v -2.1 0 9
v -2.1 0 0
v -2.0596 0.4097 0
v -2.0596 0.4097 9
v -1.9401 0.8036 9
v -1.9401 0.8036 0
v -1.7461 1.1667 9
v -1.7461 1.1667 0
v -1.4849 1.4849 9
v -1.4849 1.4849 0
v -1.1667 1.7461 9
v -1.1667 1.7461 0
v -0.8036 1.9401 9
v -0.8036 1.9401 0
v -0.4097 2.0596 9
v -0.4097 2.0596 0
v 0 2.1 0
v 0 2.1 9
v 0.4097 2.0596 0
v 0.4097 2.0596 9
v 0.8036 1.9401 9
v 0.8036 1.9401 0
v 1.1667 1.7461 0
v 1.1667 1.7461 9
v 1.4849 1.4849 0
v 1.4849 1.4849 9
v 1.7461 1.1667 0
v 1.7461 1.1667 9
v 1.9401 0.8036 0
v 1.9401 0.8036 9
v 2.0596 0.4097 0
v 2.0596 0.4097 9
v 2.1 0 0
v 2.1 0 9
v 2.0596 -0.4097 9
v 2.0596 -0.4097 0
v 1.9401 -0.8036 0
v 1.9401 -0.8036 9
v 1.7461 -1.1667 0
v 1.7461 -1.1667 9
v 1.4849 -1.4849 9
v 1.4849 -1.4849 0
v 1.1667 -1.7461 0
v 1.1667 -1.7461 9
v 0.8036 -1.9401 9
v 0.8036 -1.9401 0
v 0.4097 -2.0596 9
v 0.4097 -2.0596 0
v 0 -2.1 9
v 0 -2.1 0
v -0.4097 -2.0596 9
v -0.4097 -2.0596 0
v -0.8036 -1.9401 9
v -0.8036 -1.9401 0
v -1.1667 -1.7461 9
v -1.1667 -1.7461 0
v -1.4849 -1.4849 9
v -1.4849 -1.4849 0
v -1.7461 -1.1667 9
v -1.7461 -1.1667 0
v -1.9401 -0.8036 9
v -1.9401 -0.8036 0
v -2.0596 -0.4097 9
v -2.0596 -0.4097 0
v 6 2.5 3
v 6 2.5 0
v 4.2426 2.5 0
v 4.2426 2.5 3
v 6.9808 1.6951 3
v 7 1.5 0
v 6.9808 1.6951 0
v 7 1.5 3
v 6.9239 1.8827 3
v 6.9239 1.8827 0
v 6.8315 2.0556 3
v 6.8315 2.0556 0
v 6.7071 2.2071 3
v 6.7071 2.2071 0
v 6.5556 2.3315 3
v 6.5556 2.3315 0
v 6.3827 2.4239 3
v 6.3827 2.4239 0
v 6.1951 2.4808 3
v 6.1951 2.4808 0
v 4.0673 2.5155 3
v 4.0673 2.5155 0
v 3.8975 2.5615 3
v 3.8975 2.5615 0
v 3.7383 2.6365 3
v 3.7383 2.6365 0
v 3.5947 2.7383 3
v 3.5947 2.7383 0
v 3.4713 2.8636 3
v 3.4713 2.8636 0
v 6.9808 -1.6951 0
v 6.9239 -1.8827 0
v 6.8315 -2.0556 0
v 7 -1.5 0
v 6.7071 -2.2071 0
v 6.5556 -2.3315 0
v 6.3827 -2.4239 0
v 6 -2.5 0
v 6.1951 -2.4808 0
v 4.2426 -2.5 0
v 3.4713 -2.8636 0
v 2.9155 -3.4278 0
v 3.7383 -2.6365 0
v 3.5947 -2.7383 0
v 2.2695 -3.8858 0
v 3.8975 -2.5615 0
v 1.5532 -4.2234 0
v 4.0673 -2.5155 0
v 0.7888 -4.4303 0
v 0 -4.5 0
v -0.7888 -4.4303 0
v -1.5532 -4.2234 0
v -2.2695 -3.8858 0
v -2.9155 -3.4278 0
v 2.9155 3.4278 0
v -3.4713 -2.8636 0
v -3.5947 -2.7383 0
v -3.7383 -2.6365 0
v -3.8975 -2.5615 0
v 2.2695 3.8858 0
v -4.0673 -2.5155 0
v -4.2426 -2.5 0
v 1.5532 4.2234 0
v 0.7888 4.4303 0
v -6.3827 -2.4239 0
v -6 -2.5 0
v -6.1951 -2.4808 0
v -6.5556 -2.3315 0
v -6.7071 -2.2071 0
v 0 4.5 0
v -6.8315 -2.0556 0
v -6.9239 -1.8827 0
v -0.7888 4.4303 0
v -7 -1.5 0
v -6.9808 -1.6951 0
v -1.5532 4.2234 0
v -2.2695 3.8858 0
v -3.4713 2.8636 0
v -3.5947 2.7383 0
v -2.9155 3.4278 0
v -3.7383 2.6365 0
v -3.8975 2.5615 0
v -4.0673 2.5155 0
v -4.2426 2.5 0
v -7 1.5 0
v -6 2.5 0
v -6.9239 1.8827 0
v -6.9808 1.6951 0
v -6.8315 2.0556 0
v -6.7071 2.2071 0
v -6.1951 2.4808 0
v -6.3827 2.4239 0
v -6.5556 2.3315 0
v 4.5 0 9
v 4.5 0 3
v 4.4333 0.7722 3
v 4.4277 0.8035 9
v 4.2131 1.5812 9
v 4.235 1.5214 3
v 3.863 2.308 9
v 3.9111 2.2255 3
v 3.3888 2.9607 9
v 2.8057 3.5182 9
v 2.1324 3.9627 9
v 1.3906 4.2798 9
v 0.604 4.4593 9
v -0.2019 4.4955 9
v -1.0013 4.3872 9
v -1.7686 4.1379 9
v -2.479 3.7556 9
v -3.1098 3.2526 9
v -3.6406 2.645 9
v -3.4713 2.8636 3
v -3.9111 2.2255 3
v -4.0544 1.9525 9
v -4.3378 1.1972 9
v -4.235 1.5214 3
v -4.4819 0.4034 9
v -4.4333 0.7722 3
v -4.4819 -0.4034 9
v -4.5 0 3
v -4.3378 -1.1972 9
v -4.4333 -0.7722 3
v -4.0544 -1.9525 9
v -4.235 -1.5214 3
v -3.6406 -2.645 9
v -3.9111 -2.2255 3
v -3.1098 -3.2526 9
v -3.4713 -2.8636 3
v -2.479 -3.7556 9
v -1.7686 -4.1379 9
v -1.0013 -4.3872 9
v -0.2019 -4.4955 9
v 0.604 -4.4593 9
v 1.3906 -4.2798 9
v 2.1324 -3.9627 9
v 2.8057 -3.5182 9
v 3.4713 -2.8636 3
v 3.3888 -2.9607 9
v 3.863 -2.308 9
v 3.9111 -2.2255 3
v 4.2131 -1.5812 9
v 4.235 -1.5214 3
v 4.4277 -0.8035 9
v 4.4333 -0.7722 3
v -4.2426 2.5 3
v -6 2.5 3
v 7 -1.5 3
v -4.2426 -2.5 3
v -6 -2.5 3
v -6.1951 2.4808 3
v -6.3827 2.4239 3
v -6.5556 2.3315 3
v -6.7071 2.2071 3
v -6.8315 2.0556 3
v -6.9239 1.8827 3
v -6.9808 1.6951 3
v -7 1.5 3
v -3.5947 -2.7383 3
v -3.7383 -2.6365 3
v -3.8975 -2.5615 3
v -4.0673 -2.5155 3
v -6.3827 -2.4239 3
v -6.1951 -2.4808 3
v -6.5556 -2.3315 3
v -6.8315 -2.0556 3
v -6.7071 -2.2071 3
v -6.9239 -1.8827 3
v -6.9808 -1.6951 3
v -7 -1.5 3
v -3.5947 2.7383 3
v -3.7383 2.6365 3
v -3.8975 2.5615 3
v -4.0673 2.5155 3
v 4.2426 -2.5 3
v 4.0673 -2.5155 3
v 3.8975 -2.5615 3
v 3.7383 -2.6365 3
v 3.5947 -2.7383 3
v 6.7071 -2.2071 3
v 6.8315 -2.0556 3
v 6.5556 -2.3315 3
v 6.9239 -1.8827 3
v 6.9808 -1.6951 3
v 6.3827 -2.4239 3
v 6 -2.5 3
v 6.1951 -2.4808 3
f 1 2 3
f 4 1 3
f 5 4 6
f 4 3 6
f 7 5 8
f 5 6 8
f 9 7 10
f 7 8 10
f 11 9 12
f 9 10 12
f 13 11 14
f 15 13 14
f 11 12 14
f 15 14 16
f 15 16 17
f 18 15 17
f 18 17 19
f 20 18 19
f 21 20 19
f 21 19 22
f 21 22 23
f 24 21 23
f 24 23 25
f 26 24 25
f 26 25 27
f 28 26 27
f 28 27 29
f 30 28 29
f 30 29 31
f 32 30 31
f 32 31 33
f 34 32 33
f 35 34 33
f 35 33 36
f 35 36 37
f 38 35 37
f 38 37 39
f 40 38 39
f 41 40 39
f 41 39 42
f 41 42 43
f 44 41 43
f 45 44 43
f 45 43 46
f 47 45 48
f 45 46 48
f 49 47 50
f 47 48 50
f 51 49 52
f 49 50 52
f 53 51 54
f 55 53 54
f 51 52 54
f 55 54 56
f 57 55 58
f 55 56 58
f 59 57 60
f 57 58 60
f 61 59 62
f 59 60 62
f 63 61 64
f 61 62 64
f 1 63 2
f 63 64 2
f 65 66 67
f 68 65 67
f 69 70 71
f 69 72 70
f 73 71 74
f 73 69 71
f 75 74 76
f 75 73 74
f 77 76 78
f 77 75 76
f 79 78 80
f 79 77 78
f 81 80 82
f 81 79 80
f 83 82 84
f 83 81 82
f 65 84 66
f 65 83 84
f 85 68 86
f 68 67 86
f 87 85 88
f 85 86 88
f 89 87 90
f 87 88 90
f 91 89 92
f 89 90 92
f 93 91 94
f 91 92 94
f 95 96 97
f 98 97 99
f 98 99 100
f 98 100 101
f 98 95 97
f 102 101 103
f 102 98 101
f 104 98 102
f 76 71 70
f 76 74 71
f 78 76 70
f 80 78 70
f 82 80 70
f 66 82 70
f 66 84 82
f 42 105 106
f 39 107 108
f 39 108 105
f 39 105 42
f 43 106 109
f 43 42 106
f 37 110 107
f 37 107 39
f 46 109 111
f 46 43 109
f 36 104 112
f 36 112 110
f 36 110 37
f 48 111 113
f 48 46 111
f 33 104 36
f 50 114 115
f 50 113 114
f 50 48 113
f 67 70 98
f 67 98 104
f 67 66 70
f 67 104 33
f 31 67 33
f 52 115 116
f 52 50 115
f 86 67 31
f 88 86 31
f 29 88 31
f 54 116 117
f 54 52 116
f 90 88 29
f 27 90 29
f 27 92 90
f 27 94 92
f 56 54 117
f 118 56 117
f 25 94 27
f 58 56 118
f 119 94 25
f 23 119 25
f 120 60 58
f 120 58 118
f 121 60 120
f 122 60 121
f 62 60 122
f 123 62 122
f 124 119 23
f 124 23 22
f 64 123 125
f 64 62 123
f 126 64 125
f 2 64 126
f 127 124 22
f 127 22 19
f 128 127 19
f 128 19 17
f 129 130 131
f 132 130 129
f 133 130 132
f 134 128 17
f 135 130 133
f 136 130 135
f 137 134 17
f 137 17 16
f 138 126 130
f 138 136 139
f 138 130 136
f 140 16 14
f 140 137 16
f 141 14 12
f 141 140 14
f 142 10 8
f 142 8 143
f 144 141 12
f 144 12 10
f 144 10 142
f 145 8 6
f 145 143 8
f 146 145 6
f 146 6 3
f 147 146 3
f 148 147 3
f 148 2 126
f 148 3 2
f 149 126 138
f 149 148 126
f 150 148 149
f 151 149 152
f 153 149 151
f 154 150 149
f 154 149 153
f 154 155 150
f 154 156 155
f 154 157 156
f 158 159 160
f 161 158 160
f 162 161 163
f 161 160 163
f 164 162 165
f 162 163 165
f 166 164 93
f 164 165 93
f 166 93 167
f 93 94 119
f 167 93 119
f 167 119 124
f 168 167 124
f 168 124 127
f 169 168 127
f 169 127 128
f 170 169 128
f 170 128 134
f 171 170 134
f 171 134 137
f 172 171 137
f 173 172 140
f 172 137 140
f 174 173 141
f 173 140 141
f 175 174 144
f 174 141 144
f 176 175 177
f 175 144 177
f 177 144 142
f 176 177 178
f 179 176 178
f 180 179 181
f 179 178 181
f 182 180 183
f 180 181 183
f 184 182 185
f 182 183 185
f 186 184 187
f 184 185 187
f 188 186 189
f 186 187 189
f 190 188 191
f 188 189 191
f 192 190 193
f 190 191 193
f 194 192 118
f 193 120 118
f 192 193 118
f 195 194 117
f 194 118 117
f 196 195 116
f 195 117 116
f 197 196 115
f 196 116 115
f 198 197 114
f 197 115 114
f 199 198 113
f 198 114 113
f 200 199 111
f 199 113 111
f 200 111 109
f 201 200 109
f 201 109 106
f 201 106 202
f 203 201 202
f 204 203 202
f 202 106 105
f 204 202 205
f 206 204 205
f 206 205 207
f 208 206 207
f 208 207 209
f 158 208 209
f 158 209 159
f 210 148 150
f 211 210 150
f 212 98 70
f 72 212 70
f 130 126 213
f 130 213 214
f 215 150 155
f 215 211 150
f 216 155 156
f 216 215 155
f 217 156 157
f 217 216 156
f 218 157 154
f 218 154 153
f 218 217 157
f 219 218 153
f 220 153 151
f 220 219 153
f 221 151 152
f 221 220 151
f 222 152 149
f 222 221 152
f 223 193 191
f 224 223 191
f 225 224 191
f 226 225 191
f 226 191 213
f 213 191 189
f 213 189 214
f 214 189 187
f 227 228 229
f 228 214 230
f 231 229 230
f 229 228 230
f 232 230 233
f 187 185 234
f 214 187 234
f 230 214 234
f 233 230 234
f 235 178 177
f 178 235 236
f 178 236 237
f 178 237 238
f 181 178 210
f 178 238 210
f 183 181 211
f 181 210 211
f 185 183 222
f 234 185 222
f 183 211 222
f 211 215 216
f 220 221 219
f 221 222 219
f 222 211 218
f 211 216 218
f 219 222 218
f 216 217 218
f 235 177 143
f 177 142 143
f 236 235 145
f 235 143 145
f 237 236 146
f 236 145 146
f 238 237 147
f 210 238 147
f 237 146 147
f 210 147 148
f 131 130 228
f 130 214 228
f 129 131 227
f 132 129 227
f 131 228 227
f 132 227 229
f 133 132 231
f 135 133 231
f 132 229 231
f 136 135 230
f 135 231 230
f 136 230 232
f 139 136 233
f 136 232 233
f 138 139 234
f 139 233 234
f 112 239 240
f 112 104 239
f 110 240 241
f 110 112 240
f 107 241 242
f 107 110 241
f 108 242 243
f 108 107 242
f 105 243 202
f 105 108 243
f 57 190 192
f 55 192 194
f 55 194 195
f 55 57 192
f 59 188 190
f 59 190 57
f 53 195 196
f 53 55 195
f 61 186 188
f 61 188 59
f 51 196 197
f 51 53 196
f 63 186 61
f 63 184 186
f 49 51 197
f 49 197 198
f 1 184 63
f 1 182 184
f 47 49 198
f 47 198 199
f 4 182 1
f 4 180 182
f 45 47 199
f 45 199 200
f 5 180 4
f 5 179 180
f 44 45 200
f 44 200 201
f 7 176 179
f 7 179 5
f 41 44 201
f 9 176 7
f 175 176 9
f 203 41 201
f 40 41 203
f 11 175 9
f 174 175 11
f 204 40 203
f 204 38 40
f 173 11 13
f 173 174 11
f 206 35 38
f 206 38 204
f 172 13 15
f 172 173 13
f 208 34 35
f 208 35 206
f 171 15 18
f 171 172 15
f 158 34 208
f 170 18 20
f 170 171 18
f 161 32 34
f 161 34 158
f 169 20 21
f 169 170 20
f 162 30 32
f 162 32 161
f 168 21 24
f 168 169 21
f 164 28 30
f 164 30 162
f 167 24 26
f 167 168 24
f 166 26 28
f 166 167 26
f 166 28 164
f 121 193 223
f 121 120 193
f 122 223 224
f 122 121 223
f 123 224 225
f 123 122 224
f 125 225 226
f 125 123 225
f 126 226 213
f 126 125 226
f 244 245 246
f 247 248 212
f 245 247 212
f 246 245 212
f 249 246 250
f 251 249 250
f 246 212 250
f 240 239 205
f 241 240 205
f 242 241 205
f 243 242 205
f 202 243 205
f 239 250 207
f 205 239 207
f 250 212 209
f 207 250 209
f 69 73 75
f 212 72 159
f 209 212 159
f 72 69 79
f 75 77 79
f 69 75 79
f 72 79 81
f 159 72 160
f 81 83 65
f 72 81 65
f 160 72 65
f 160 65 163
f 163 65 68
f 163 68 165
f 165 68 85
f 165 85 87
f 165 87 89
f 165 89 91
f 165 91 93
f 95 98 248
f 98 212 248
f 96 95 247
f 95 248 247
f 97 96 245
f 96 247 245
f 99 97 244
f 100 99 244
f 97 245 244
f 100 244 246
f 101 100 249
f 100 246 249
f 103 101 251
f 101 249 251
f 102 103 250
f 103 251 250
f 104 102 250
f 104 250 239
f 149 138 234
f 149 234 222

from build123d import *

# Parameters (mm, degrees)
SKETCH_1_R         = 4.5
EXTRUDE_1_DEPTH    = 9
SKETCH_2_W         = 14
SKETCH_2_H         = 5
EXTRUDE_2_DEPTH    = 3
HOLE_WIZARD_M5_1_D = 4.2
FILLET_1_R         = 1


with BuildPart() as part:
    # 草图1 → 凸台-拉伸1 (new body)
    with BuildSketch(Plane.XY):
        Circle(SKETCH_1_R)
    extrude(amount=EXTRUDE_1_DEPTH)

    # 草图2 → 凸台-拉伸2 (add)
    with BuildSketch(Plane(origin=(0, 0, 0), x_dir=(-1, 0, 0), z_dir=(0, 0, -1))):
        Rectangle(SKETCH_2_W, SKETCH_2_H)
    extrude(amount=-EXTRUDE_2_DEPTH)

    # M5 螺纹孔1 (through all)
    with Locations(Plane.XY.offset(9)):
        with Locations((0, 0)):
            Hole(HOLE_WIZARD_M5_1_D / 2)

    # 圆角1
    fillet_1_edges = [part.edges().sort_by_distance(p)[0] for p in [
        (-7, -2.5, 1.5),
        (7, 2.5, 1.5),
        (-7, 2.5, 1.5),
        (-3.741657387, -2.5, 1.5),
        (3.741657387, -2.5, 1.5),
        (7, -2.5, 1.5),
        (3.741657387, 2.5, 1.5),
        (-3.741657387, 2.5, 1.5),
    ]]
    fillet(fillet_1_edges, radius=FILLET_1_R)


solid = part.part
